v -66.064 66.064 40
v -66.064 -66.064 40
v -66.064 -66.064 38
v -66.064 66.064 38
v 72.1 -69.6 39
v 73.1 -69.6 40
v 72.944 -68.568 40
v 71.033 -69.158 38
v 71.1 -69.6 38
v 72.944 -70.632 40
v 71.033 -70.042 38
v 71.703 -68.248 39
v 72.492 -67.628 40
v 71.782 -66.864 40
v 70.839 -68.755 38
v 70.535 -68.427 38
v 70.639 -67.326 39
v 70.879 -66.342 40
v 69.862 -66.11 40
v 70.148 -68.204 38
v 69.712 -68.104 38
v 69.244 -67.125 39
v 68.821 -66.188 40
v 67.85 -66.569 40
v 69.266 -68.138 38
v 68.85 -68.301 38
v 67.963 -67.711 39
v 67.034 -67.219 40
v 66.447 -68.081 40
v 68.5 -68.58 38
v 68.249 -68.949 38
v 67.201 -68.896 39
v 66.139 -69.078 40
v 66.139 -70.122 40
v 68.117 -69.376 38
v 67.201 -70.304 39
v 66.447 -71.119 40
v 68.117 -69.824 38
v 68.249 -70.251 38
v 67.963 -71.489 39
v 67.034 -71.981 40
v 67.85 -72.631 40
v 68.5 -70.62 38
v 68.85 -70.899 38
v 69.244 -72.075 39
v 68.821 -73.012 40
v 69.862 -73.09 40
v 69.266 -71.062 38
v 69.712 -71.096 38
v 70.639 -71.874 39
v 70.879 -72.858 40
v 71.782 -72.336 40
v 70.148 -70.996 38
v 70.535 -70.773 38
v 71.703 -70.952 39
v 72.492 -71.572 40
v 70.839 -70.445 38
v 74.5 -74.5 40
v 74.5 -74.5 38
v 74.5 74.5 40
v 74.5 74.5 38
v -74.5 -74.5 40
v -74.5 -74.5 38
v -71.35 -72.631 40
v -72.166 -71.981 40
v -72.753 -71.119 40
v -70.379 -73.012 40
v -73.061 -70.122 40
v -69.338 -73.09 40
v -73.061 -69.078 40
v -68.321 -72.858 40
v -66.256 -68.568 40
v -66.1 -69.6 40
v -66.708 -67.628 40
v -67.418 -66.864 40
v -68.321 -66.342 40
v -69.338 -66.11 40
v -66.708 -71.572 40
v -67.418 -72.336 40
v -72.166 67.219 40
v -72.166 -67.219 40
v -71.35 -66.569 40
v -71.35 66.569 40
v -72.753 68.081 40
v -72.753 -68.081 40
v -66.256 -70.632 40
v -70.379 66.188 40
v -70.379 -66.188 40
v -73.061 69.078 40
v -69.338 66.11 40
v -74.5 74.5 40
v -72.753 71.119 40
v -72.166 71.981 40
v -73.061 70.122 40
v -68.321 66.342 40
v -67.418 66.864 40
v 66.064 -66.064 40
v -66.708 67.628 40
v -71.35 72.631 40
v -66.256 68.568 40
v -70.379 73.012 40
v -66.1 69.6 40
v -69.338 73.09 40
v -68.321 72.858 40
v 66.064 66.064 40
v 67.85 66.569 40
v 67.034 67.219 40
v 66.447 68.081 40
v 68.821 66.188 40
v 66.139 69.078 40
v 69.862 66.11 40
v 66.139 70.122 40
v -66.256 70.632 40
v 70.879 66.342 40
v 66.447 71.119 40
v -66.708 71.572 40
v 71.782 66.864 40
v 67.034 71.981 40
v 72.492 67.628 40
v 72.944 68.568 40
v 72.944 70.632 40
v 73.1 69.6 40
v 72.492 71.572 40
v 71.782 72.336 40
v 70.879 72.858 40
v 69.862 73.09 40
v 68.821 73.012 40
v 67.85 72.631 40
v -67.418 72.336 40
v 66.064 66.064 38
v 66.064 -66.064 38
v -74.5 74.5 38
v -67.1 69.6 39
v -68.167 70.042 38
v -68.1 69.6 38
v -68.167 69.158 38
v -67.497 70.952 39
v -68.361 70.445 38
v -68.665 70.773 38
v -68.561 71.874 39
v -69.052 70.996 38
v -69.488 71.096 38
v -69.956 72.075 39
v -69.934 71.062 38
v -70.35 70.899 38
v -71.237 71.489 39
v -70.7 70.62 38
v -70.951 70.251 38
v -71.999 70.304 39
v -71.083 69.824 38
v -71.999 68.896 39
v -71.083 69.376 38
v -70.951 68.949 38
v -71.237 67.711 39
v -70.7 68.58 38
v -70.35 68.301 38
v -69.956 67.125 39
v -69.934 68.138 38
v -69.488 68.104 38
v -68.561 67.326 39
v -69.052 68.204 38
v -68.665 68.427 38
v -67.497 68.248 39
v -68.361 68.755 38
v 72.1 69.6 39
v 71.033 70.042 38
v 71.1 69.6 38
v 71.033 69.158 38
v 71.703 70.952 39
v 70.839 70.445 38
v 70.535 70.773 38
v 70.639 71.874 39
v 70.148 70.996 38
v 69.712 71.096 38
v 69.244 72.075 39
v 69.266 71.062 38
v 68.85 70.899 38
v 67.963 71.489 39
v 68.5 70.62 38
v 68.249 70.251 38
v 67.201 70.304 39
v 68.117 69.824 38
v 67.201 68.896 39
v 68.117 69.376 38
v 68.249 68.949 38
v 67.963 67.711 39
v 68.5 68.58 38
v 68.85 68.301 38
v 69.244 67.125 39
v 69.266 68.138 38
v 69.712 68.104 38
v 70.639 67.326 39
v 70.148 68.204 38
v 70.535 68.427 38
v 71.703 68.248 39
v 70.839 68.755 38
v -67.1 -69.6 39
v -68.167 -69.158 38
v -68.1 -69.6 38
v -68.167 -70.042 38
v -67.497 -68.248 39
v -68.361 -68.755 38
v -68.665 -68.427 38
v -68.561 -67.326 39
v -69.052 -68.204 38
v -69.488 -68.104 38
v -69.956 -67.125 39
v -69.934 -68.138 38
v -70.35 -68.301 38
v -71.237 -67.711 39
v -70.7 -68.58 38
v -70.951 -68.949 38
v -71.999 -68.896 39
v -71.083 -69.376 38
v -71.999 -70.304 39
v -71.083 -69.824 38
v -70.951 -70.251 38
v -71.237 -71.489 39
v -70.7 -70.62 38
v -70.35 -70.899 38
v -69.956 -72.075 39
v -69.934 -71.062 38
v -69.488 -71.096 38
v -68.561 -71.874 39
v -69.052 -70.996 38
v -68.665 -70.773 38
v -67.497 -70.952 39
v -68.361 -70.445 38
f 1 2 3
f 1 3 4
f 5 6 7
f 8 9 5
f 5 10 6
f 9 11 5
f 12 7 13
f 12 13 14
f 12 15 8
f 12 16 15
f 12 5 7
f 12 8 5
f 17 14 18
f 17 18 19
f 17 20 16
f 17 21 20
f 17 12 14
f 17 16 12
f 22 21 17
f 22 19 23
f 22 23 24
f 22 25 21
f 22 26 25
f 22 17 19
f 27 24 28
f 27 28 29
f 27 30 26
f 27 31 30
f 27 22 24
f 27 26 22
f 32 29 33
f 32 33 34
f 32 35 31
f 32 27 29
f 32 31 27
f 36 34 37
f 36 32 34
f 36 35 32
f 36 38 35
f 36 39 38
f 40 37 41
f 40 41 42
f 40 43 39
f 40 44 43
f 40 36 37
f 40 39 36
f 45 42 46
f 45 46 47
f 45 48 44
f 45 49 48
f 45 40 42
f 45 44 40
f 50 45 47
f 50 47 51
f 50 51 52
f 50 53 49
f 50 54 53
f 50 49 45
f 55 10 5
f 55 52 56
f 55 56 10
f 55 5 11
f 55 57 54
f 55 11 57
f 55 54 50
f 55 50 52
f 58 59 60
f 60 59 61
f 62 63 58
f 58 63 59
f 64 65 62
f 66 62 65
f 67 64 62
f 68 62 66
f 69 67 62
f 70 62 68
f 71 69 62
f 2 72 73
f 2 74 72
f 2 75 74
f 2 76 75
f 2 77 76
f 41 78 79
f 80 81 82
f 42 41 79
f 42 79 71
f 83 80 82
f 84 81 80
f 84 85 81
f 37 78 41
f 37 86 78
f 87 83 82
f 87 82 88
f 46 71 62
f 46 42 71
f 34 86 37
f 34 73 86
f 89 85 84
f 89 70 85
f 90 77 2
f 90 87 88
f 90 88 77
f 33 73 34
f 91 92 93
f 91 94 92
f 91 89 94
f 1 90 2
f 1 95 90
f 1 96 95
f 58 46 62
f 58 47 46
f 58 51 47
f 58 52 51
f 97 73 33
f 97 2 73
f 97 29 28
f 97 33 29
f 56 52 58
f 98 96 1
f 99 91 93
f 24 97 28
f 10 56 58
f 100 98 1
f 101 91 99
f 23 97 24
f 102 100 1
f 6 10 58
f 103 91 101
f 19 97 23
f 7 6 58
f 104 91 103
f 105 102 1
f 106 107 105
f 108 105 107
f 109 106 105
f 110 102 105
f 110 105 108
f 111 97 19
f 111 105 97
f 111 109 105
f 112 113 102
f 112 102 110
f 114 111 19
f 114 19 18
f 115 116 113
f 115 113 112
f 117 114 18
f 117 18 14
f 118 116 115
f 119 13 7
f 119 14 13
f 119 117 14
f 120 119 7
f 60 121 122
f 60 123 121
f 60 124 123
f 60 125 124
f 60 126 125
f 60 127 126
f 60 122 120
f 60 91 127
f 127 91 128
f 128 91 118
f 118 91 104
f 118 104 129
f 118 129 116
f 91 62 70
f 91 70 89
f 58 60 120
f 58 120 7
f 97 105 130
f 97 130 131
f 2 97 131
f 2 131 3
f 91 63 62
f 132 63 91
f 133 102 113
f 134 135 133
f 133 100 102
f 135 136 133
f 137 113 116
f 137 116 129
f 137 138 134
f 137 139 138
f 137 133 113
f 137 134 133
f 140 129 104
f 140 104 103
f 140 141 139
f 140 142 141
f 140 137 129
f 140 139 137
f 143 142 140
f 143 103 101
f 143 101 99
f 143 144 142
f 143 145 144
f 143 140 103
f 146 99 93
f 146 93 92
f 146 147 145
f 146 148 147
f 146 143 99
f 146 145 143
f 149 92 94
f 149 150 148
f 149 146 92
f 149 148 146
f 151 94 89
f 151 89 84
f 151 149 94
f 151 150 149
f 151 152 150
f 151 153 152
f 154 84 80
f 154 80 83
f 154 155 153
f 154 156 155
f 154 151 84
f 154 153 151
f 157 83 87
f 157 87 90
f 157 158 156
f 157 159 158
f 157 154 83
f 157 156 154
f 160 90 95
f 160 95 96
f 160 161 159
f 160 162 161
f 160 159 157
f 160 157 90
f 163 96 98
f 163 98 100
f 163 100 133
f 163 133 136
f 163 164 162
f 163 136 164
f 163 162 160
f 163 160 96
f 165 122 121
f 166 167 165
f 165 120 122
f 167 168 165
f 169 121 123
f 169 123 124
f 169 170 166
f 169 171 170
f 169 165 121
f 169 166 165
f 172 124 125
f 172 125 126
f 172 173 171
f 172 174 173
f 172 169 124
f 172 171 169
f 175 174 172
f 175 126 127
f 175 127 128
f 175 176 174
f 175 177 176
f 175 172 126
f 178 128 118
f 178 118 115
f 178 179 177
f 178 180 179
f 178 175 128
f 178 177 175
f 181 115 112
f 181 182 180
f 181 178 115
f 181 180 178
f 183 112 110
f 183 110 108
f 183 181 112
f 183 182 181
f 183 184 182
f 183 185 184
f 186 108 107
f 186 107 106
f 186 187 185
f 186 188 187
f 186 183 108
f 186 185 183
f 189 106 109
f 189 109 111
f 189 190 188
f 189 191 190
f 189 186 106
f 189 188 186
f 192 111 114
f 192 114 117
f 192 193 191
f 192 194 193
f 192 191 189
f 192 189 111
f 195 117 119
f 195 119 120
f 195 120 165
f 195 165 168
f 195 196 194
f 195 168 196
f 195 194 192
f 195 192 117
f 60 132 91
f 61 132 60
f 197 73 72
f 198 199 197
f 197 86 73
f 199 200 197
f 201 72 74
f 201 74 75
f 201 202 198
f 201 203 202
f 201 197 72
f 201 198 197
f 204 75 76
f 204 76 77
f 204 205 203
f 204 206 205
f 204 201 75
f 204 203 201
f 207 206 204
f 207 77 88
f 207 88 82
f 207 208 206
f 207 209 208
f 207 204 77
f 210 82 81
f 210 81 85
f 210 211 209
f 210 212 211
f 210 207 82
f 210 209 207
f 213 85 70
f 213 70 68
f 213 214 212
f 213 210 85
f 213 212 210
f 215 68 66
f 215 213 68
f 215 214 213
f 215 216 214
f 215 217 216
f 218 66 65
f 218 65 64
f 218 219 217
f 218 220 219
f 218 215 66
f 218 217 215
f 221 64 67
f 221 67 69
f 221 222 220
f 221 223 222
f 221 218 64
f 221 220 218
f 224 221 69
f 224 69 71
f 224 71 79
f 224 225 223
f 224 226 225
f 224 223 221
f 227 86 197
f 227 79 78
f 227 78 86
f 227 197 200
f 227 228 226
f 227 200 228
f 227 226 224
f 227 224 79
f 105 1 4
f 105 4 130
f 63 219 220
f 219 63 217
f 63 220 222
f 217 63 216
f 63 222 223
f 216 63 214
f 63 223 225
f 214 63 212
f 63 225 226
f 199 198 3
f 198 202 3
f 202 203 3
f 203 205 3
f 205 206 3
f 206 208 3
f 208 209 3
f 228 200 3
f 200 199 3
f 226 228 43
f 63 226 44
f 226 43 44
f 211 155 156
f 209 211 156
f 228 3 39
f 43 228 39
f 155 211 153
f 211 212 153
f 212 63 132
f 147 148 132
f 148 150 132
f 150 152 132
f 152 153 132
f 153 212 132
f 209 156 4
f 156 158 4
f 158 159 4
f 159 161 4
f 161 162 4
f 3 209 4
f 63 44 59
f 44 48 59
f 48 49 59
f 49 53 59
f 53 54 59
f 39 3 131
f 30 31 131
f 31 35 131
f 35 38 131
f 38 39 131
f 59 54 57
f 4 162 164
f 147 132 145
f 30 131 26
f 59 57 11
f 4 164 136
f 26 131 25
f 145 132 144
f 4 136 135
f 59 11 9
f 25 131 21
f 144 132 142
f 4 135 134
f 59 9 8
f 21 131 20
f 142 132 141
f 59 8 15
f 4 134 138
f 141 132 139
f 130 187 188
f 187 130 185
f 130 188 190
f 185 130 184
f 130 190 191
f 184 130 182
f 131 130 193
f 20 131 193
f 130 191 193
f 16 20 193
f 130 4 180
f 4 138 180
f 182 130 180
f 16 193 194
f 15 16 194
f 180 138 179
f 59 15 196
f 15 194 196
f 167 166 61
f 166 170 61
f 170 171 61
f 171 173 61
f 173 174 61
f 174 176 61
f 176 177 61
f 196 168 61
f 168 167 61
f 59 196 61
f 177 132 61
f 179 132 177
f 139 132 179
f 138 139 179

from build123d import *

# Parameters (mm, degrees)
F1_DEPTH  = 5
F0_W      = 115
F0_H      = 3
F0_W_2    = 3
F0_H_2    = 115
F2_DEPTH  = 2
F3_R      = 2.5
F4_DEPTH  = 5
F5_W      = 149
F5_H      = 149
F6_DEPTH  = 35
F7_R      = 1.5
F8_DEPTH  = 35
F9_W      = 149
F9_H      = 50.5775869712
F10_DEPTH = 200
F12_DEPTH = 2
F13_SIZE  = 1.99999


# Not quite as in the source:
# - a fillet or chamfer is up to 0.001 mm smaller than in the source, because OpenCascade refuses the exact size


with BuildPart() as f1:
    # F0 (on Top) → F1 (new body)
    with BuildSketch(Plane.XY):
        Polygon((74.5, 74.5), (60.5, 74.5), (-60.5, 74.5), (-74.5, 74.5), (-74.5, 60.5), (-74.5, -60.5), (-74.5, -74.5), (-60.5, -74.5), (60.5, -74.5), (74.5, -74.5), (74.5, -60.5), (74.5, 60.5), align=None)
        Polygon((57.5, 60.5), (60.5, 60.5), (60.5, 57.5), (60.5, -57.5), (60.5, -60.5), (57.5, -60.5), (-57.5, -60.5), (-60.5, -60.5), (-60.5, -57.5), (-60.5, 57.5), (-60.5, 60.5), (-57.5, 60.5), align=None, mode=Mode.SUBTRACT)
    extrude(amount=F1_DEPTH)

    # F0 (on Top) → F2 (join)
    with BuildSketch(Plane.XY):
        with Locations((0, 59)):
            Rectangle(F0_W, F0_H)
        with Locations((59, 59)):
            Rectangle(F0_W_2, F0_H)
        with Locations((59, 0)):
            Rectangle(F0_W_2, F0_H_2)
        with Locations((59, -59)):
            Rectangle(F0_W_2, F0_H)
        with Locations((0, -59)):
            Rectangle(F0_W, F0_H)
        with Locations((-59, 0)):
            Rectangle(F0_W_2, F0_H_2)
        with Locations((-59, -59)):
            Rectangle(F0_W_2, F0_H)
        with Locations((-59, 59)):
            Rectangle(F0_W_2, F0_H)
    extrude(amount=F2_DEPTH)

    # F3 (on face) → F4 (cut, through all)
    with BuildSketch(Plane.XY.offset(5)):
        with Locations((42.5219088793, 68.0854469538)):
            Circle(F3_R)
    extrude(amount=-F4_DEPTH, mode=Mode.SUBTRACT)

    # F5 (on face) → F6 (join)
    with BuildSketch(Plane.XY.offset(5)):
        Rectangle(F5_W, F5_H)
        Polygon((-60.5, 71.5), (60.5, 71.5), (71.5, 71.5), (71.5, 60.5), (71.5, -60.5), (71.5, -71.5), (60.5, -71.5), (-60.5, -71.5), (-71.5, -71.5), (-71.5, -60.5), (-71.5, 60.5), (-71.5, 71.5), align=None, mode=Mode.SUBTRACT)
    extrude(amount=F6_DEPTH)

    # F7 (on face) → F8 (join)
    with BuildSketch(Plane.XY.offset(40)):
        with BuildLine():
            ThreePointArc((-71.5, 64.975068144), (-66.8161183572, 65.4466893403), (-64.6000009775, 69.6000009775))
            ThreePointArc((-64.6000009775, 69.6000009775), (-64.6946638756, 70.5683335217), (-64.975068144, 71.5))
            Line((-64.975068144, 71.5), (-71.5, 71.5))
            Line((-71.5, 71.5), (-71.5, 64.975068144))
        make_face()
        with Locations((-69.6000009775, 69.6000009775)):
            Circle(F7_R, mode=Mode.SUBTRACT)
        with BuildLine():
            Line((71.5, 71.5), (64.975068144, 71.5))
            ThreePointArc((64.975068144, 71.5), (66.0644670716, 66.0644670716), (71.5, 64.975068144))
            Line((71.5, 64.975068144), (71.5, 71.5))
        make_face()
        with Locations((69.6000009775, 69.6000009775)):
            Circle(F7_R, mode=Mode.SUBTRACT)
        with BuildLine():
            Line((71.5, -71.5), (71.5, -64.975068144))
            ThreePointArc((71.5, -64.975068144), (66.0644670716, -66.0644670716), (64.975068144, -71.5))
            Line((64.975068144, -71.5), (71.5, -71.5))
        make_face()
        with Locations((69.6000009775, -69.6000009775)):
            Circle(F7_R, mode=Mode.SUBTRACT)
        with BuildLine():
            ThreePointArc((-64.6000009775, -69.6000009775), (-66.8161183572, -65.4466893403), (-71.5, -64.975068144))
            Line((-71.5, -64.975068144), (-71.5, -71.5))
            Line((-71.5, -71.5), (-64.975068144, -71.5))
            ThreePointArc((-64.975068144, -71.5), (-64.6946638756, -70.5683335217), (-64.6000009775, -69.6000009775))
        make_face()
        with Locations((-69.6000009775, -69.6000009775)):
            Circle(F7_R, mode=Mode.SUBTRACT)
    extrude(amount=-F8_DEPTH)

    # F9 (on face) → F10 (cut)
    with BuildSketch(Plane.XZ.offset(74.5)):
        with Locations((0, 12.7112065144)):
            Rectangle(F9_W, F9_H)
    extrude(amount=-F10_DEPTH, mode=Mode.SUBTRACT)

    # F11 (on face) → F12 (join)
    with BuildSketch(Plane.XY.offset(40)):
        with BuildLine():
            ThreePointArc((-64.975068144, 71.5), (-64.6974956073, 68.6174323567), (-66.0644670716, 66.0644670716))
            Line((-66.0644670716, 66.0644670716), (66.0644670716, 66.0644670716))
            ThreePointArc((66.0644670716, 66.0644670716), (64.6974956073, 68.6174323567), (64.975068144, 71.5))
            Line((64.975068144, 71.5), (-64.975068144, 71.5))
        make_face()
        with BuildLine():
            ThreePointArc((71.5, 64.975068144), (68.6174323567, 64.6974956073), (66.0644670716, 66.0644670716))
            Line((66.0644670716, 66.0644670716), (66.0644670716, -66.0644670716))
            ThreePointArc((66.0644670716, -66.0644670716), (68.6174323567, -64.6974956073), (71.5, -64.975068144))
            Line((71.5, -64.975068144), (71.5, 64.975068144))
        make_face()
        with BuildLine():
            Line((66.0644670716, -66.0644670716), (-66.0644670716, -66.0644670716))
            ThreePointArc((-66.0644670716, -66.0644670716), (-64.6974956073, -68.6174323567), (-64.975068144, -71.5))
            Line((-64.975068144, -71.5), (64.975068144, -71.5))
            ThreePointArc((64.975068144, -71.5), (64.6974956073, -68.6174323567), (66.0644670716, -66.0644670716))
        make_face()
        with BuildLine():
            Line((-66.0644670716, -66.0644670716), (-66.0644670716, 66.0644670716))
            ThreePointArc((-66.0644670716, 66.0644670716), (-68.6174323567, 64.6974956073), (-71.5, 64.975068144))
            Line((-71.5, 64.975068144), (-71.5, -64.975068144))
            ThreePointArc((-71.5, -64.975068144), (-68.6174323567, -64.6974956073), (-66.0644670716, -66.0644670716))
        make_face()
    extrude(amount=-F12_DEPTH)

    # F13 (size 2 in the source; OpenCascade refuses exactly that, so slightly less here)
    f13_edges = [f1.edges().sort_by_distance(p)[0] for p in [
        (-71.100001, 69.600001, 40),
        (68.100001, 69.600001, 40),
        (68.100001, -69.600001, 40),
        (-71.100001, -69.600001, 40),
    ]]
    chamfer(f13_edges, length=F13_SIZE)


solid = f1.part
